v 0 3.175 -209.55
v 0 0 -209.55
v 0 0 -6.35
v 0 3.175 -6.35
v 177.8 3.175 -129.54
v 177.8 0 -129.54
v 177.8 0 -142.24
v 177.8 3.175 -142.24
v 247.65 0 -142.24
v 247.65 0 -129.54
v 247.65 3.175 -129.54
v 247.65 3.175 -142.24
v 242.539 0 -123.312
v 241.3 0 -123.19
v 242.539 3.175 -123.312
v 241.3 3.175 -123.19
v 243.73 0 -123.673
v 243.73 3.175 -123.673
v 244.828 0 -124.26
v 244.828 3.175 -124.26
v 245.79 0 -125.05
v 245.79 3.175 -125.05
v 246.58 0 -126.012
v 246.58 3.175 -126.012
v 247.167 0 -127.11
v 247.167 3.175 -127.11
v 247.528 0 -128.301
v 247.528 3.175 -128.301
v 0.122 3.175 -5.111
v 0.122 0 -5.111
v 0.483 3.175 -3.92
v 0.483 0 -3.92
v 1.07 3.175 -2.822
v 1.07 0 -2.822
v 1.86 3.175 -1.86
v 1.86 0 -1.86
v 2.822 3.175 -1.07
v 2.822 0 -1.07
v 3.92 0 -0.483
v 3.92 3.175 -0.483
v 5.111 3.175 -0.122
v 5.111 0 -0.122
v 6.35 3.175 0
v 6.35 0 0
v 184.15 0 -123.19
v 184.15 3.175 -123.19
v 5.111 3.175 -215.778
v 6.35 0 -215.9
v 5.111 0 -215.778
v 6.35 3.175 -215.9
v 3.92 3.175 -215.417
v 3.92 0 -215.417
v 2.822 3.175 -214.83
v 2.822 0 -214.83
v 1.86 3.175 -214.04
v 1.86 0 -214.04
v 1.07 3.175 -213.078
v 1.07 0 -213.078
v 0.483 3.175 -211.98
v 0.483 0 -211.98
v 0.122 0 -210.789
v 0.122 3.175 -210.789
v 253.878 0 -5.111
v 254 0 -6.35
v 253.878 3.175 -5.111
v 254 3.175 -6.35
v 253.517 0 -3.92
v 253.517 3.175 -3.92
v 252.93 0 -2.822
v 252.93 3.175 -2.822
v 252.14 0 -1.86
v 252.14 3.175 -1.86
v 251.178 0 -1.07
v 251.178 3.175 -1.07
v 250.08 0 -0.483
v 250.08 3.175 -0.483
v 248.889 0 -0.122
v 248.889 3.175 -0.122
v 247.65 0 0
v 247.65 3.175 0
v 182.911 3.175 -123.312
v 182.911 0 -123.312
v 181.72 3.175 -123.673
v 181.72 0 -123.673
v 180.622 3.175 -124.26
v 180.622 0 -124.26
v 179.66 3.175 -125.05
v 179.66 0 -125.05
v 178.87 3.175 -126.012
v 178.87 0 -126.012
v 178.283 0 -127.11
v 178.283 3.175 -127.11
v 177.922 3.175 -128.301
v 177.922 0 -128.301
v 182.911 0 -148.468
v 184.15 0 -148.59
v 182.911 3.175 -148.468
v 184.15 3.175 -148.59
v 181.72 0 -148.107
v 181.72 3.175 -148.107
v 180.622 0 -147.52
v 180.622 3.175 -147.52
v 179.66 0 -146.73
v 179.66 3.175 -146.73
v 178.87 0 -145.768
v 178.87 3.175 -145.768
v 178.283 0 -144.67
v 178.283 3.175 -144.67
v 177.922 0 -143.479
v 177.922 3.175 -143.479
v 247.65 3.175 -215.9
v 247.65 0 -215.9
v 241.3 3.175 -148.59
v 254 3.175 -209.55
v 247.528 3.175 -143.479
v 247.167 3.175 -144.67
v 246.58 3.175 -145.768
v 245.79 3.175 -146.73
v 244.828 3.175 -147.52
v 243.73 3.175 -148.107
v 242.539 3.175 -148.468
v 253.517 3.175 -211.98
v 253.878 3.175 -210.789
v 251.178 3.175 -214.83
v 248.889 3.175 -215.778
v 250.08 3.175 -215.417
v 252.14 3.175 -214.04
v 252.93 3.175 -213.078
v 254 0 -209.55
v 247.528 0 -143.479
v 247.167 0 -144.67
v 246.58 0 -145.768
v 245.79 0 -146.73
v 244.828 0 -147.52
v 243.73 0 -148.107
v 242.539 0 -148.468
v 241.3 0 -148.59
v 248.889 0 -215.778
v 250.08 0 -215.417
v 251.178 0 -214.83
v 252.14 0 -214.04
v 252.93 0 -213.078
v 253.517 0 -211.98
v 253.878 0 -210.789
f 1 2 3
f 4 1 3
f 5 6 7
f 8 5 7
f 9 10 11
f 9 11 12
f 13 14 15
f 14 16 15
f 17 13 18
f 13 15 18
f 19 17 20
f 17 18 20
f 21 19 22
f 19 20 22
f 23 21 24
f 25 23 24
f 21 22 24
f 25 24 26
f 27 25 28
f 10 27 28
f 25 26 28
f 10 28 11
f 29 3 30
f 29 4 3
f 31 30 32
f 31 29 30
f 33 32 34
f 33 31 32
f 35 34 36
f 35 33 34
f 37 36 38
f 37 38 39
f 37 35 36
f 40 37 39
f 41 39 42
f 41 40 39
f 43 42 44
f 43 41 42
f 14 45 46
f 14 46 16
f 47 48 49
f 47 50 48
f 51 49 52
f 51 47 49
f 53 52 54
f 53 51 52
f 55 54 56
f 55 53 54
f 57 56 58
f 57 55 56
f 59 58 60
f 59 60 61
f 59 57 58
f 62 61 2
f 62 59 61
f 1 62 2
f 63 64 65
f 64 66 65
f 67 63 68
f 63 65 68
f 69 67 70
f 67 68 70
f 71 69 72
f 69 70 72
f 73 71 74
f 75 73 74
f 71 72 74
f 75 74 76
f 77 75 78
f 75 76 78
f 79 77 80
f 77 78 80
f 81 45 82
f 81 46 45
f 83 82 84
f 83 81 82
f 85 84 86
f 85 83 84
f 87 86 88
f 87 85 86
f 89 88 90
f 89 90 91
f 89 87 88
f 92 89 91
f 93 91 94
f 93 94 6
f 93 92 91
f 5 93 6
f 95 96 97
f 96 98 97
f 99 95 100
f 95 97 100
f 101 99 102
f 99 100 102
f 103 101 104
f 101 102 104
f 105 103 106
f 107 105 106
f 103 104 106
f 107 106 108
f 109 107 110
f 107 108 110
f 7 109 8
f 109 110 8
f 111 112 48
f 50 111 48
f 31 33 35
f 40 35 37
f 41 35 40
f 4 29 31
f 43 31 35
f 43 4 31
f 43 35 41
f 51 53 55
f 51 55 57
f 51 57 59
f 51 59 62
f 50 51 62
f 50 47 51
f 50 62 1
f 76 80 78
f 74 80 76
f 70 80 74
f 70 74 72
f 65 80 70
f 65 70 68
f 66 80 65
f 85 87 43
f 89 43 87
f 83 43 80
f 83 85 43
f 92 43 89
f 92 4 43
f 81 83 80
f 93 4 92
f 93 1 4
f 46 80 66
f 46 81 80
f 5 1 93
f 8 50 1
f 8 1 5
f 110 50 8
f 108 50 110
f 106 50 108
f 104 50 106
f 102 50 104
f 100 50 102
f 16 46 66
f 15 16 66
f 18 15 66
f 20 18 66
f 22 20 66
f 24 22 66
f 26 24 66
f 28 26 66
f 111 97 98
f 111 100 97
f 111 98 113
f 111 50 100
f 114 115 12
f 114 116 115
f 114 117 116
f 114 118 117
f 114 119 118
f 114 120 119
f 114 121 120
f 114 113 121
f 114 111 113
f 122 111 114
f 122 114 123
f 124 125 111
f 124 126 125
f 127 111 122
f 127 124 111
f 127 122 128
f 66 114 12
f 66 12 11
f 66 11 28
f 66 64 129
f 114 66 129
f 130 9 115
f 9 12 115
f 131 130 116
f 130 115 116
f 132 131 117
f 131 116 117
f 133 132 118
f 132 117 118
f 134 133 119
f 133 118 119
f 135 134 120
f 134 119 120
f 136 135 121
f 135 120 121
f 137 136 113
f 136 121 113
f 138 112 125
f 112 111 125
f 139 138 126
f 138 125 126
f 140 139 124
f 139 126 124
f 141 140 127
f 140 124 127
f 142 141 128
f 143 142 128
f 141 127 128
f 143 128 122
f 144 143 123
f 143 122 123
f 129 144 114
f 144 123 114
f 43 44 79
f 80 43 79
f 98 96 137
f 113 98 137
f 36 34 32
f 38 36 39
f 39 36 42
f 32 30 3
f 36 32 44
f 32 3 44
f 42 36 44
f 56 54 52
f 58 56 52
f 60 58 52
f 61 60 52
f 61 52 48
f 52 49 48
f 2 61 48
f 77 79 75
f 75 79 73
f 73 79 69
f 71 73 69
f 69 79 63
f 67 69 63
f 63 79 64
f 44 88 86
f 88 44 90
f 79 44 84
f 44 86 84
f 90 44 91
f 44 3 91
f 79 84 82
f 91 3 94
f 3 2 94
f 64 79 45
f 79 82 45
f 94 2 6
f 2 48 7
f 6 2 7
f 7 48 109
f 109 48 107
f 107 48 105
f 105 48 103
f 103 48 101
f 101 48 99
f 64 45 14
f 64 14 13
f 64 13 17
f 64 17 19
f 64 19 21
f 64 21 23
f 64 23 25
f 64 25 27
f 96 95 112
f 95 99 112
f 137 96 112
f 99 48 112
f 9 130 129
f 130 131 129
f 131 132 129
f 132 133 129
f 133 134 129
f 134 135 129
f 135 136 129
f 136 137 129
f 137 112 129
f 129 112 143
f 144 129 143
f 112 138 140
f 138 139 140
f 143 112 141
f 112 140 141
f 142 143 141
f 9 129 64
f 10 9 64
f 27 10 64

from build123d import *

# Parameters (mm, degrees)
SKETCH1_W           = 69.85
SKETCH1_H           = 25.4
BOSS_EXTRUDE1_DEPTH = 3.175
FILLET1_R           = 6.35


with BuildPart() as part:
    # Sketch1 → Boss-Extrude1 (new body)
    with BuildSketch(Plane(origin=(0, 0, 0), x_dir=(1, 0, 0), z_dir=(0, 1, 0))):
        Polygon((254, 148.59), (254, 215.9), (0, 215.9), (0, 0), (254, 0), (254, 123.19), align=None)
        with Locations((212.725, 135.89)):
            Rectangle(SKETCH1_W, SKETCH1_H, mode=Mode.SUBTRACT)
    extrude(amount=BOSS_EXTRUDE1_DEPTH)

    # Fillet1
    fillet1_edges = [part.edges().sort_by_distance(p)[0] for p in [
        (0, 1.5875, -215.9),
        (254, 1.5875, -215.9),
        (254, 1.5875, 0),
        (0, 1.5875, 0),
        (177.8, 1.5875, -148.59),
        (177.8, 1.5875, -123.19),
        (247.65, 1.5875, -123.19),
        (247.65, 1.5875, -148.59),
    ]]
    fillet(fillet1_edges, radius=FILLET1_R)


solid = part.part
